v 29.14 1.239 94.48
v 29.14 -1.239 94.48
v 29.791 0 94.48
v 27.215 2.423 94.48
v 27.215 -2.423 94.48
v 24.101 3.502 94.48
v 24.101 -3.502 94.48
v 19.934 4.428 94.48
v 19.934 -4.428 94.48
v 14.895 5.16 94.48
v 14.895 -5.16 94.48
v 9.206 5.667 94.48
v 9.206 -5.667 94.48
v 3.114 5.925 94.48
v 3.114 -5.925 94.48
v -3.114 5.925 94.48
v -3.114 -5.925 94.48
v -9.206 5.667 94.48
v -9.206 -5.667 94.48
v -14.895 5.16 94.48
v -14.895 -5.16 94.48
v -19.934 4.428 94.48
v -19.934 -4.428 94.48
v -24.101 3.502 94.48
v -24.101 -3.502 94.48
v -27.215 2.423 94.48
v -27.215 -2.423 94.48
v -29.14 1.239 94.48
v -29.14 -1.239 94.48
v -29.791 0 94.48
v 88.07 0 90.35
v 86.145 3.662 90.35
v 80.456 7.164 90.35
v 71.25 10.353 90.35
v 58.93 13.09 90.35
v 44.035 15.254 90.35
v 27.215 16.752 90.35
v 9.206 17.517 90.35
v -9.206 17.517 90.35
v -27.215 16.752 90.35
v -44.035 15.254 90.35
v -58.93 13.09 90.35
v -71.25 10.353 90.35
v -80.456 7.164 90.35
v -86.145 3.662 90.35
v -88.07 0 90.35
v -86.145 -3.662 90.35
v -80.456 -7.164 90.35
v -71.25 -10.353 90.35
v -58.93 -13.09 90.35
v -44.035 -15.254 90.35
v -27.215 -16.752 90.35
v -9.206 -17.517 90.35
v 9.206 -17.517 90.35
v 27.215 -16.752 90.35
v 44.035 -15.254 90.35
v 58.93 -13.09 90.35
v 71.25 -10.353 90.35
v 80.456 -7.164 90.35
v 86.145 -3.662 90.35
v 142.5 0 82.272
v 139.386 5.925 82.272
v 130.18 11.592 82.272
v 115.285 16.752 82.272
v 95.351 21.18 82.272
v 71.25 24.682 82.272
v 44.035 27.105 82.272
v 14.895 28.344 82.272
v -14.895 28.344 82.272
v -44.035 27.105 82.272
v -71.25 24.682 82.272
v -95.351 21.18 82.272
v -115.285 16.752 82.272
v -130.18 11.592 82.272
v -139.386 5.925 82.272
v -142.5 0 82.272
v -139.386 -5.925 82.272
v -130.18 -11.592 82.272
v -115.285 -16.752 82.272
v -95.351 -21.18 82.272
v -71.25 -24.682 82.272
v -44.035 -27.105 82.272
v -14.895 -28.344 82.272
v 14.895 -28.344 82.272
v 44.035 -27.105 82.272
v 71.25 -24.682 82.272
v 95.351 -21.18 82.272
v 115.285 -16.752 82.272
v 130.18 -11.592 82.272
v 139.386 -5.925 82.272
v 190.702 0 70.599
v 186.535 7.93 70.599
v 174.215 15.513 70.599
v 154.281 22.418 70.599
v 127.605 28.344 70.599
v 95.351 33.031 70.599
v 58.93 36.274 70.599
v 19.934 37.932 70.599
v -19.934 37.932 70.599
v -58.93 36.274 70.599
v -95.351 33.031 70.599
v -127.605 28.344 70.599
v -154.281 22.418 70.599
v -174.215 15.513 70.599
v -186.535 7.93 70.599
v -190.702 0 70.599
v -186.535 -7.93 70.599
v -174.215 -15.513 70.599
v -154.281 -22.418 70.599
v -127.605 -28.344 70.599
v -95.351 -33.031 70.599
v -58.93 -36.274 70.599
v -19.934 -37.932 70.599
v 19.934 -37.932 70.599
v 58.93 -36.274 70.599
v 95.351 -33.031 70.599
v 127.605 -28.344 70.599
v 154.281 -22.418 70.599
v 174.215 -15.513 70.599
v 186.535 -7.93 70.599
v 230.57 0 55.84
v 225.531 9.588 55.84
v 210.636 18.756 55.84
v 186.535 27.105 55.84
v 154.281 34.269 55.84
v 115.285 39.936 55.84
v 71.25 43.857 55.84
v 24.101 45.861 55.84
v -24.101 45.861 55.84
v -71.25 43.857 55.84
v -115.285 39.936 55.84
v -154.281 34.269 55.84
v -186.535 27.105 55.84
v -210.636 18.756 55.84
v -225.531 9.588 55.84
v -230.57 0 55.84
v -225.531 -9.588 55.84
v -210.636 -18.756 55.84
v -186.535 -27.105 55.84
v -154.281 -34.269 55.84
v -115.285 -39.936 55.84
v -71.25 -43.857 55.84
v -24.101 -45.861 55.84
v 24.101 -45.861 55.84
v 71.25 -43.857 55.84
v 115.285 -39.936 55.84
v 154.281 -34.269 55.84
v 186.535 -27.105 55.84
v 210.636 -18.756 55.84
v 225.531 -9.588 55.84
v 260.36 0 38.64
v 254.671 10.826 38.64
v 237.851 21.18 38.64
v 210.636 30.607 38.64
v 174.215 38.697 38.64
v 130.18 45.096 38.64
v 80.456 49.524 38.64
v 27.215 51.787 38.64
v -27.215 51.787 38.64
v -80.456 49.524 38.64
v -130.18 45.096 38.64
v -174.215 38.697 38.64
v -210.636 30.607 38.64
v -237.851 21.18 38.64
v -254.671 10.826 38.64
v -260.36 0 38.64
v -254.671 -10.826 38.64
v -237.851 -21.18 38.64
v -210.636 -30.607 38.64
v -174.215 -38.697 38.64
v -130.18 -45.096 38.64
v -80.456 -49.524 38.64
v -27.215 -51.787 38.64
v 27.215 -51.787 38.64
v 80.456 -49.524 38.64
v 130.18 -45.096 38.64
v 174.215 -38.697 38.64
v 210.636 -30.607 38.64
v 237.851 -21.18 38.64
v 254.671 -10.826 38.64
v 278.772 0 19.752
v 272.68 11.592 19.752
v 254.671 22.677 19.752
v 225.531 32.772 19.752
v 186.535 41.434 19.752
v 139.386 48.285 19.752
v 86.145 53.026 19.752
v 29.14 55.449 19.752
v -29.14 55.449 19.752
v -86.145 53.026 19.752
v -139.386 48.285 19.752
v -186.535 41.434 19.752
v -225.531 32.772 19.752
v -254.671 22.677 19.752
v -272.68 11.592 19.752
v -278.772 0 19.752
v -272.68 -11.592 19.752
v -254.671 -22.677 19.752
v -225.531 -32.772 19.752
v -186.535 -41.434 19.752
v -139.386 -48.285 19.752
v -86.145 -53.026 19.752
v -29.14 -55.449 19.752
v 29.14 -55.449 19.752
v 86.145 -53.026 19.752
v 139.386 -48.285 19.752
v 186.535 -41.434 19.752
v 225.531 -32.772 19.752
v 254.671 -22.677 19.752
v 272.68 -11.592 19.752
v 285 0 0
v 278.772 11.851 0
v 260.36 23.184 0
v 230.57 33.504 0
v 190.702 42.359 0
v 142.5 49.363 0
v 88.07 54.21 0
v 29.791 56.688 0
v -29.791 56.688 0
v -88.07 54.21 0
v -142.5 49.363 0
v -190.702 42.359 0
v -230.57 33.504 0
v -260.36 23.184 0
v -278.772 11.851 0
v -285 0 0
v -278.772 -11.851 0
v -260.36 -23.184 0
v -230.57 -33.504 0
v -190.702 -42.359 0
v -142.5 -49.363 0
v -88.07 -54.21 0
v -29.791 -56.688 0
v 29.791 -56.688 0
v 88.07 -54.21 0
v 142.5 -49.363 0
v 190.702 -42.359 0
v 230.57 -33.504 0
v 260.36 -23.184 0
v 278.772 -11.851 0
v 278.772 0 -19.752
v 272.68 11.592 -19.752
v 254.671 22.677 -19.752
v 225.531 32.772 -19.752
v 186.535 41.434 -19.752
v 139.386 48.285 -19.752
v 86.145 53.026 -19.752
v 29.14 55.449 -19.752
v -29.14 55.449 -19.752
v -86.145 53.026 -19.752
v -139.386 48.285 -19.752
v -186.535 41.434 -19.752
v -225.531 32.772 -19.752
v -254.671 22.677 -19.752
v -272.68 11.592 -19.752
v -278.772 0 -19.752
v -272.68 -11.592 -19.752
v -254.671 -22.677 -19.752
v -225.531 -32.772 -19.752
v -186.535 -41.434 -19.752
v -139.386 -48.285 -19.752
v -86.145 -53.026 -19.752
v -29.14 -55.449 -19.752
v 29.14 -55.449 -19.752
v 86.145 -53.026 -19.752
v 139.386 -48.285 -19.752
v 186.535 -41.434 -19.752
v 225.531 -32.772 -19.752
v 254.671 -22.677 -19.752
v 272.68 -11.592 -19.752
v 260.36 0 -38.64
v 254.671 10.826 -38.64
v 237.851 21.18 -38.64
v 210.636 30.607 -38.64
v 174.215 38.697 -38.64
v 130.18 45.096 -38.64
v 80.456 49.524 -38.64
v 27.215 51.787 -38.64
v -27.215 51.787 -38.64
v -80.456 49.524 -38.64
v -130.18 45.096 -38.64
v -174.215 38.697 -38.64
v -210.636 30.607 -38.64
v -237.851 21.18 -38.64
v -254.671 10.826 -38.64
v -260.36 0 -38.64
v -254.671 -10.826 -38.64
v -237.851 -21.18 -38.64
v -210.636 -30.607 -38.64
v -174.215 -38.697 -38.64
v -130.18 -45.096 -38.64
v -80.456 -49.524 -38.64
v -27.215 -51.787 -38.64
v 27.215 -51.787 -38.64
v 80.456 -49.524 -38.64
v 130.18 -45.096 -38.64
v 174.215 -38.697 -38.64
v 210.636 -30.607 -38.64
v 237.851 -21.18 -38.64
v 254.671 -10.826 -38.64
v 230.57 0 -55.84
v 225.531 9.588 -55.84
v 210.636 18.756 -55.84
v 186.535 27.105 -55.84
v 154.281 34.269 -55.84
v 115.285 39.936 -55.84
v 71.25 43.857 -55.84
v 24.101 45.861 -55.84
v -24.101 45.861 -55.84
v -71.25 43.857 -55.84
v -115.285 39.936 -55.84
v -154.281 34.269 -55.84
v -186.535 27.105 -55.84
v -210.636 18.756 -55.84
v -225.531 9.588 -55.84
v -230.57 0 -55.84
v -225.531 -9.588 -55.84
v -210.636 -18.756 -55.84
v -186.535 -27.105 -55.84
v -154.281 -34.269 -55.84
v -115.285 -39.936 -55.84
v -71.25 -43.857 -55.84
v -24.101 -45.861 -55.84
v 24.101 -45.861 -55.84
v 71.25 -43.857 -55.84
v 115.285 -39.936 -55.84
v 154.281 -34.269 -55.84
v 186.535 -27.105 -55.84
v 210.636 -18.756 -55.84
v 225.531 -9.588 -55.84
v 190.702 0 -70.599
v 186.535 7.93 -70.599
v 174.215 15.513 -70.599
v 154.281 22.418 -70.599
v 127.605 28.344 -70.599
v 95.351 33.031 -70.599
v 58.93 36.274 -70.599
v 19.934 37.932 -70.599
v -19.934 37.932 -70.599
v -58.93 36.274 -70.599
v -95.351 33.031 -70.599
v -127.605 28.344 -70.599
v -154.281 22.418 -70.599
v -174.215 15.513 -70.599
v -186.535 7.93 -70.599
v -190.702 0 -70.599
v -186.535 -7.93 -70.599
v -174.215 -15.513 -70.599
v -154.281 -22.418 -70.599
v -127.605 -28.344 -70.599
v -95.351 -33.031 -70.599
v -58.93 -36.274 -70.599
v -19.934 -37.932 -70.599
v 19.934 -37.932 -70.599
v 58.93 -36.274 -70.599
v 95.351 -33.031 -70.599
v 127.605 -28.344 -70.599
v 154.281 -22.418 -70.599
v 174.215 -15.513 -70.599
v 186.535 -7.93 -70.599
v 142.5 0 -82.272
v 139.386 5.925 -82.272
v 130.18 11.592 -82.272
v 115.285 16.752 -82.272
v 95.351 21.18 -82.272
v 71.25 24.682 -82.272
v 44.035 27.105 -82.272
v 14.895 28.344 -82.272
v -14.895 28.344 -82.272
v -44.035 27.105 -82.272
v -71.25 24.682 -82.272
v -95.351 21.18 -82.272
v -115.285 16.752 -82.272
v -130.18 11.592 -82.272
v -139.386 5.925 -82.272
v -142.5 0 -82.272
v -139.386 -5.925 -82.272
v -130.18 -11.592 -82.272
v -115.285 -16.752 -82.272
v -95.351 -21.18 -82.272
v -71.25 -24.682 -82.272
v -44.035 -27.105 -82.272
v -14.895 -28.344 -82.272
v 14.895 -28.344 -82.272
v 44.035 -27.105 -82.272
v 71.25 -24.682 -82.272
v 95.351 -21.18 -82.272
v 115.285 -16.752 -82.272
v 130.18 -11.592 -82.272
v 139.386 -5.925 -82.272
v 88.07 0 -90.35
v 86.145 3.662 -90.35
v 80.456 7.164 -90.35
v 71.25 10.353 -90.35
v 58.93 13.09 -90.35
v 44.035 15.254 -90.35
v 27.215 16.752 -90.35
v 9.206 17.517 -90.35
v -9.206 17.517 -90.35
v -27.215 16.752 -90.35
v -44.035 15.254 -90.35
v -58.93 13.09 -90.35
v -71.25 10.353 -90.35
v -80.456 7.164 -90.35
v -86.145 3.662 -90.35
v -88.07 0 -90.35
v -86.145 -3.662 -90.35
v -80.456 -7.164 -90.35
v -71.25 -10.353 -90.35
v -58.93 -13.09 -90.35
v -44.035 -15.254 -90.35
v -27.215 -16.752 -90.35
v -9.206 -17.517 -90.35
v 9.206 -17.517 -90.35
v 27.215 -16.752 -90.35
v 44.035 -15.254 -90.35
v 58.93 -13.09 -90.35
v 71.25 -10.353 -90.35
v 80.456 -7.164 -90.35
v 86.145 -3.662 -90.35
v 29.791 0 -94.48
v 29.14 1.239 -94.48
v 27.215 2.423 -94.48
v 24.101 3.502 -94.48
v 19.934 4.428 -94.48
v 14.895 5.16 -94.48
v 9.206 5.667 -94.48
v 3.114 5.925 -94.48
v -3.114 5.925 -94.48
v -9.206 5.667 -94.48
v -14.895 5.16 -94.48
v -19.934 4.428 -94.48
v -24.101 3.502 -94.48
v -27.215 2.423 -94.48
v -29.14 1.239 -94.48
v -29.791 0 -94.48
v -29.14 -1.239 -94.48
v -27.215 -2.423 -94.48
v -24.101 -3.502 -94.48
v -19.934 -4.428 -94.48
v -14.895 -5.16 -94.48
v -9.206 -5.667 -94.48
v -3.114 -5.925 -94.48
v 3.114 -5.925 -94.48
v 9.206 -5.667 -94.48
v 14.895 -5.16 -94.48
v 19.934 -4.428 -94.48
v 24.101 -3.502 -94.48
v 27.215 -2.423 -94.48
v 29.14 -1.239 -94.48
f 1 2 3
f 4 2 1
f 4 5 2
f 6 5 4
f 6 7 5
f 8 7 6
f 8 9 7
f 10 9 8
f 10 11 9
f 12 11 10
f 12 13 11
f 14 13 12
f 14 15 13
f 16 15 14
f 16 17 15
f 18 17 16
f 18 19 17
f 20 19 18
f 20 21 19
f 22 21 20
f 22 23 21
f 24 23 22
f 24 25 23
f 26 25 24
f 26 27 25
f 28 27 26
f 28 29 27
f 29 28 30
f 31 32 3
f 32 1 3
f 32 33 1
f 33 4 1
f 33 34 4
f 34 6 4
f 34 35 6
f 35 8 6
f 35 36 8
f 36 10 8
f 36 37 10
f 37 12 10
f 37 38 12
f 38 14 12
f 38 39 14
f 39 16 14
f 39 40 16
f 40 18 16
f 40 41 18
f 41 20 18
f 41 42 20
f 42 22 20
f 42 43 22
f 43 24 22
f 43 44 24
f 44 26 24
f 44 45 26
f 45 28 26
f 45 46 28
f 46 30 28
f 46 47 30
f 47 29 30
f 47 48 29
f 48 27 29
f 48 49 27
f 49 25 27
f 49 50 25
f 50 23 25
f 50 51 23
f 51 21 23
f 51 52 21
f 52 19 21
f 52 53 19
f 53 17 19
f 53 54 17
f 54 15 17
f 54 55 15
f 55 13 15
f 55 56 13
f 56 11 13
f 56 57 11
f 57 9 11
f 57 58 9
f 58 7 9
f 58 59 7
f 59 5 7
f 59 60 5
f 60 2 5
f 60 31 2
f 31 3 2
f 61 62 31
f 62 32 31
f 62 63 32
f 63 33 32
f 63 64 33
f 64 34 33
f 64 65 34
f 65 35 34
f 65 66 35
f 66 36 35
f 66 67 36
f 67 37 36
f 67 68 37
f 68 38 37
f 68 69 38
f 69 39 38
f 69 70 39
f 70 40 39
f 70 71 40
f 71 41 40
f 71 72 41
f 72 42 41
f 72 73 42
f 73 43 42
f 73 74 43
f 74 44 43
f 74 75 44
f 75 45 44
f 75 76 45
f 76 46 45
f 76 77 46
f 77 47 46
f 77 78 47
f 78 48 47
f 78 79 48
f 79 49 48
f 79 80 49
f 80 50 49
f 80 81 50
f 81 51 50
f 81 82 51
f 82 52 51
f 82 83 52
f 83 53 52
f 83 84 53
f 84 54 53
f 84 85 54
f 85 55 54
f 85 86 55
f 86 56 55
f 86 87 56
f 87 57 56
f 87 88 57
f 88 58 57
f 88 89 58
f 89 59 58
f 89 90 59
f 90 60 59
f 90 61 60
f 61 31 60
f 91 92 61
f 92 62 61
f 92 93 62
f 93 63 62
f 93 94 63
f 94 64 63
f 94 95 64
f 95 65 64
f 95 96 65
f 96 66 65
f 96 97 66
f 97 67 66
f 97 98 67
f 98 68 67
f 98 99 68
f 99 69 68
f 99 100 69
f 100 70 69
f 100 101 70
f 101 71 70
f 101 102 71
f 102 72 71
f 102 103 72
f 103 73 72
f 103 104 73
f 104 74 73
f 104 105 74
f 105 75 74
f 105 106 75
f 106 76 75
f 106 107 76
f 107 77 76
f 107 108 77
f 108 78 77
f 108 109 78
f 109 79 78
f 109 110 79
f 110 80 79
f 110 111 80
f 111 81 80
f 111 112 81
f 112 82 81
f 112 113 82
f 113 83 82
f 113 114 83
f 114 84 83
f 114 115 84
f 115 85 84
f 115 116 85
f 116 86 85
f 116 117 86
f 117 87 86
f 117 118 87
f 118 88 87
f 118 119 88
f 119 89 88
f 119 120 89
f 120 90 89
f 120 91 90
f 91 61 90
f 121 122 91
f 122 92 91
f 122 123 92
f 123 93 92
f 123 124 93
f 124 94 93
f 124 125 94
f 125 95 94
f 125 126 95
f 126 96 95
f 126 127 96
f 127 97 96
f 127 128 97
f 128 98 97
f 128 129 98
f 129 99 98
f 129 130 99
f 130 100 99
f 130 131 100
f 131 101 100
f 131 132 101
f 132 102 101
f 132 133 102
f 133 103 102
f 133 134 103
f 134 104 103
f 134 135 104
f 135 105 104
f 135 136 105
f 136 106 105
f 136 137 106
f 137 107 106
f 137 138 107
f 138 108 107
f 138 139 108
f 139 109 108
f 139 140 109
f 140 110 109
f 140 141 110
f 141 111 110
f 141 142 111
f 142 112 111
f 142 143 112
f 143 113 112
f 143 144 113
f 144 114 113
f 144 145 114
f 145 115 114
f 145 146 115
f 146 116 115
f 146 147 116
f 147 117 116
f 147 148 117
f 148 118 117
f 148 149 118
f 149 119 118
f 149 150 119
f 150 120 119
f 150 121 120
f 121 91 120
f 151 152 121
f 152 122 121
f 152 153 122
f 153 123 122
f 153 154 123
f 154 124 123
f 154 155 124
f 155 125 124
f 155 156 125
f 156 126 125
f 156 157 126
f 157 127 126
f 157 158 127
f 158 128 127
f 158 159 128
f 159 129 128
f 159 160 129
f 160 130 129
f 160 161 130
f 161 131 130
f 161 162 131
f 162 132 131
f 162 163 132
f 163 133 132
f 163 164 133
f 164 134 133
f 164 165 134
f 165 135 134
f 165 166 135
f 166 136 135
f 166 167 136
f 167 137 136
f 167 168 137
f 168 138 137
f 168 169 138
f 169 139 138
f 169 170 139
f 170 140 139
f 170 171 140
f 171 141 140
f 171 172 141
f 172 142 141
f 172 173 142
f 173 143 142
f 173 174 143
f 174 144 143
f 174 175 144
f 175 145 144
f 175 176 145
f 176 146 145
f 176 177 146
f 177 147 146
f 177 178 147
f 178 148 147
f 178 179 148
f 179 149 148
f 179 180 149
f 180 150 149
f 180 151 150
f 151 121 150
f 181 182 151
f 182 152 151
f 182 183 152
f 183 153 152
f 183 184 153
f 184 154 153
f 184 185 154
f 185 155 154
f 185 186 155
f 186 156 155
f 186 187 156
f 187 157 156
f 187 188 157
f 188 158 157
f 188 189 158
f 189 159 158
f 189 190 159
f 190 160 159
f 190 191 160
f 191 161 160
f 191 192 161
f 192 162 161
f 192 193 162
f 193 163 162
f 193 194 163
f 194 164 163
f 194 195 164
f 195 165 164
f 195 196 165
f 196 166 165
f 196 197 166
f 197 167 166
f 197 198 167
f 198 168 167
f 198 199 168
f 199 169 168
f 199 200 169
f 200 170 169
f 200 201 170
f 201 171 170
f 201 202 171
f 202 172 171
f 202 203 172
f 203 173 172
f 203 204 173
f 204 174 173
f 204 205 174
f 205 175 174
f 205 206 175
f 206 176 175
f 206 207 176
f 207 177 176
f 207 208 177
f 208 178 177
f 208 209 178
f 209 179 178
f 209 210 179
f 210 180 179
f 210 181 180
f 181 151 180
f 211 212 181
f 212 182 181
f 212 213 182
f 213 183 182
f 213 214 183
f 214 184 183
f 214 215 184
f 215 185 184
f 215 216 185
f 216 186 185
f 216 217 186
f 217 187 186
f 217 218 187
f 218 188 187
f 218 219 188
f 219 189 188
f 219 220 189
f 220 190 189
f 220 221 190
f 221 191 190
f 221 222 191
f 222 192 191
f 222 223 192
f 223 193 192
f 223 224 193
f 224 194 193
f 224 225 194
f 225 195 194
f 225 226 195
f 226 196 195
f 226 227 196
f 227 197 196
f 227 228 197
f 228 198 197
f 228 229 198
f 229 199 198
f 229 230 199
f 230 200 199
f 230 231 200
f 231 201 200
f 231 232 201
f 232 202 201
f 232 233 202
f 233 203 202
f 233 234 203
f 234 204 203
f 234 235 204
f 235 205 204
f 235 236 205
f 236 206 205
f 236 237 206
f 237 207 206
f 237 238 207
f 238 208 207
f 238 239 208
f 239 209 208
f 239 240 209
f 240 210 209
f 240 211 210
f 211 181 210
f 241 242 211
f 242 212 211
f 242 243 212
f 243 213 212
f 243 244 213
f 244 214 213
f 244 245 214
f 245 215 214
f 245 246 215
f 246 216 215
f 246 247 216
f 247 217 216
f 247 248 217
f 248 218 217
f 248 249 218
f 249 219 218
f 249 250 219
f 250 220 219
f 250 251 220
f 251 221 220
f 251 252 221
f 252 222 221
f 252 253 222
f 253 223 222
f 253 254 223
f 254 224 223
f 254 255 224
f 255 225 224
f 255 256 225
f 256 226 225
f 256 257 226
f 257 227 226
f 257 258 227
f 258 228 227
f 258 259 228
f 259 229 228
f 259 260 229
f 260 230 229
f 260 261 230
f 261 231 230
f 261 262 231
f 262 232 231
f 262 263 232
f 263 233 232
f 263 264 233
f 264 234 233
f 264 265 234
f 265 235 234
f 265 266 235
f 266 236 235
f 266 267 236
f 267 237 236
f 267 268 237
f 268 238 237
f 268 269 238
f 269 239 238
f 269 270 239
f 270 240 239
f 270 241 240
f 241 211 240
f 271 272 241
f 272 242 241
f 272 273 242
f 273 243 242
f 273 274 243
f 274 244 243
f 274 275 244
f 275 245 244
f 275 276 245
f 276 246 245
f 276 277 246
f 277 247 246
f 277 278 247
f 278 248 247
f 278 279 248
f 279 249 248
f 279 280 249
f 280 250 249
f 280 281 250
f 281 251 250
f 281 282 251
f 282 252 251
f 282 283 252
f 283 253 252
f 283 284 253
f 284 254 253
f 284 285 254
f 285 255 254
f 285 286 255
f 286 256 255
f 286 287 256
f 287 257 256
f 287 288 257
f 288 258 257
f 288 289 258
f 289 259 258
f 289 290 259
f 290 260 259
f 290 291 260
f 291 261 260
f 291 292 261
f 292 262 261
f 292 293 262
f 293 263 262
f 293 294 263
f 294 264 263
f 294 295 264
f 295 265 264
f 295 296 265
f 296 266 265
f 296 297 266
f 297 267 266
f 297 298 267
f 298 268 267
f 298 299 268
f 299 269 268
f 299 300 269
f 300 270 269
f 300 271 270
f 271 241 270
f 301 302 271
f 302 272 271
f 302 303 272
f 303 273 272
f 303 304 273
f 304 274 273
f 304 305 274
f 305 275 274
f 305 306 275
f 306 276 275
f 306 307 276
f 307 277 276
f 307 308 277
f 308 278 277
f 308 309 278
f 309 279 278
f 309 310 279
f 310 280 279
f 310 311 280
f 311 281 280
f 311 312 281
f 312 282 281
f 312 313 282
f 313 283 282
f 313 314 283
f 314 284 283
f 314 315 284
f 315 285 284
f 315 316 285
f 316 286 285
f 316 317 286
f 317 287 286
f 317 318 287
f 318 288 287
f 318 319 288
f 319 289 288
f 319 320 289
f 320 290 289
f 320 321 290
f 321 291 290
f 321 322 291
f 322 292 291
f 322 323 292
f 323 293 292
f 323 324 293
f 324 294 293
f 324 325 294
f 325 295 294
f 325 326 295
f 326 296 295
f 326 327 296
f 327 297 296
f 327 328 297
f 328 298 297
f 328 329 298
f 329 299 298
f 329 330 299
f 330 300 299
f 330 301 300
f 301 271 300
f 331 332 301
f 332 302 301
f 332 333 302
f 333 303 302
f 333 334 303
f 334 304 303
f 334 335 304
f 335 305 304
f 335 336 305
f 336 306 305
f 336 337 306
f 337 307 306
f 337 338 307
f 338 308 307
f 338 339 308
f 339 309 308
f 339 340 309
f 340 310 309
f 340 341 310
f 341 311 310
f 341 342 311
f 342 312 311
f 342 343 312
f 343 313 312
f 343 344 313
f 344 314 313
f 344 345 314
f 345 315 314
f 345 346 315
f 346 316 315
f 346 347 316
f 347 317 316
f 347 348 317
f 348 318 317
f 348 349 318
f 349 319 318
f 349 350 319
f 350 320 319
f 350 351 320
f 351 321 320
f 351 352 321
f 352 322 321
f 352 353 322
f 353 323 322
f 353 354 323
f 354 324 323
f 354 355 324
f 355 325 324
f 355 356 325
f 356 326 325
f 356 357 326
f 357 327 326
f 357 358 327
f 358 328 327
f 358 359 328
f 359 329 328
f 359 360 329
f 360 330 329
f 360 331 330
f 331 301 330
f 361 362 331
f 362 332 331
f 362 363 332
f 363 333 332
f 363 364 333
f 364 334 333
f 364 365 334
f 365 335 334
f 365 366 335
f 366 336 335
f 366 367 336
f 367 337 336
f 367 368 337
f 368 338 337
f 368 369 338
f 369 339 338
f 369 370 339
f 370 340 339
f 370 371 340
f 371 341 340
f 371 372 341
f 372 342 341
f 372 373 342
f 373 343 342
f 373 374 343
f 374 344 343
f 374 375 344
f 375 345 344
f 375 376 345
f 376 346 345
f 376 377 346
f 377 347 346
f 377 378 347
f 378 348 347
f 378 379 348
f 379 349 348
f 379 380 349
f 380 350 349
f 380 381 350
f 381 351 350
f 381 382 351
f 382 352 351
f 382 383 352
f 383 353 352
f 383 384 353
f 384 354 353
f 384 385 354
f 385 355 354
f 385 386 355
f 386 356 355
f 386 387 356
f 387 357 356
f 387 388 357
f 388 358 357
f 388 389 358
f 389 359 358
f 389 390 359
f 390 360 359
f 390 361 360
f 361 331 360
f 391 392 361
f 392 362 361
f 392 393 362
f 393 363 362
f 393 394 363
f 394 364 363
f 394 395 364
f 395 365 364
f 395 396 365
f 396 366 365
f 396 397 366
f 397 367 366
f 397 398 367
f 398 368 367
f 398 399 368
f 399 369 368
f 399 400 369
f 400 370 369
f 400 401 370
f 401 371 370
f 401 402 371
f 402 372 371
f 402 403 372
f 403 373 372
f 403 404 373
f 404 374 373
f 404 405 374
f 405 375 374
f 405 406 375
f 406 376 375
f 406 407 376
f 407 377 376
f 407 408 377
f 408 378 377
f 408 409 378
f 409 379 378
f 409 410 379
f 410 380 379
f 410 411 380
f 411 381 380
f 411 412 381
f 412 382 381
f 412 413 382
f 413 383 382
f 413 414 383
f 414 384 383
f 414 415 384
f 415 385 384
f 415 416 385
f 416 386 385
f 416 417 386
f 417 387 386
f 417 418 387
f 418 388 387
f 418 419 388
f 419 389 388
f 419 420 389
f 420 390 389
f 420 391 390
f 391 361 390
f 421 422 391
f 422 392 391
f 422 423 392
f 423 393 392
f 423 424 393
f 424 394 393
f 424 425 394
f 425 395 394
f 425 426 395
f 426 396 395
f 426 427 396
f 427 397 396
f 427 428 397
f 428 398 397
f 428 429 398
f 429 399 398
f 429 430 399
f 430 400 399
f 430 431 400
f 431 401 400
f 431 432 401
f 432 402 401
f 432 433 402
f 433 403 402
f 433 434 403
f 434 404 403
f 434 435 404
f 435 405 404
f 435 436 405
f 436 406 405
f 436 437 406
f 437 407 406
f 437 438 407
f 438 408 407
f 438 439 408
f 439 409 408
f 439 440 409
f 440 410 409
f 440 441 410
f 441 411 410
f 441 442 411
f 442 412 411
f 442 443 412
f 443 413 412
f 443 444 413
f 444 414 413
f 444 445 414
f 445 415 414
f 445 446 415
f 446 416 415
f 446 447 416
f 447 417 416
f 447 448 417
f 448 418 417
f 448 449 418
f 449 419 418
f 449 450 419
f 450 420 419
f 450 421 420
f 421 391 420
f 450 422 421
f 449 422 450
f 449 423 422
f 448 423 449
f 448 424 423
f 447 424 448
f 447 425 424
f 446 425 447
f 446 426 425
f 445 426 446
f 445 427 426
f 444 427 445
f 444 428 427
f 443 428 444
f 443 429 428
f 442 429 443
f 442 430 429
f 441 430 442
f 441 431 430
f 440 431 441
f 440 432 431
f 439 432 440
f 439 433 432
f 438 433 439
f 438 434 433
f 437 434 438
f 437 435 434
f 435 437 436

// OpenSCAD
// Generated by SolidPython 1.0.1 on 2020-07-29 00:46:51


scale(v = [15, 3, 5]) {
	sphere(r = 19);
}
/***********************************************
*********      SolidPython code:      **********
************************************************
 
# import packages: SolidPython
from solid import *
from solid.utils import *
from itertools import chain, combinations, permutations


class Resize:

    def __init__(self, scad_file):
        self.scad_file = scad_file
        #self.scad_file = import_scad(scad_file)
        # cone/cylinder param:
        self.r1 = 0
        self.r2 = 0
        self.h = 0
        # rectangular prism param:
        self.w = 0
        self.l = 0
        # ellipse param:
        self.r = 0

    # import OpenScad code (file name corresponds to shape)


    # classify shape + parameters
    def assign(self, param1, param2, param3):
        if self.scad_file == 'cone.scad':
            self.r1 = param1
            self.r2 = param2
            self.h = param3
        elif self.scad_file == 'cylinder.scad':
            self.r1 = param1
            self.r2 = param2
            self.h = param3
        elif self.scad_file == 'rectangularPrism.scad':
            self.h = param1
            self.l = param2
            self.w = param3
        else:
            self.r = param1
            self.h = param2

    # resize parameters
    def iterate(self):
        x = range(3, 20, 2)
        i = 1
        if self.scad_file == 'cone.scad':
            tempList = list(permutations(x, 2))
            for temp in tempList:
                param1 = temp[0]
                param2 = temp[1]
                filepath = 'produced_scad_files/' + 'cone' + str(param1) + '_' + str(param2) + '_' + '.scad'
                scad_render_to_file(cylinder(h=param1, r1=param2, r2=0), filepath)

        elif self.scad_file == 'cylinder.scad':
            tempList = list(permutations(x, 3))
            for temp in tempList:
                param1 = temp[0]
                param2 = temp[1]
                filepath = 'produced_scad_files/' + 'cylinder' + str(param1) + '_' + str(param2) + '_' + '.scad'
                scad_render_to_file(cylinder(h=param1, r1=param2, r2=param2), filepath)

        elif self.scad_file == 'rectangularPrism.scad':
            tempList = list(permutations(x, 3))
            for temp in tempList:
                param1 = temp[0]
                param2 = temp[1]
                param3 = temp[2]
                filepath = 'produced_scad_files/' + 'rectangularPrism' + str(param1) + '_' + str(param2) + '_' + str(
                    param3) + '.scad'
                scad_render_to_file(cube(size=(param1, param2, param3)), filepath)

        elif self.scad_file == 'ellipse.scad':
            tempList = list(permutations(x, 4))
            for temp in tempList:
                param1 = temp[0]
                param2 = temp[1]
                param3 = temp[2]
                param4 = temp[3]
                filepath = 'produced_scad_files/' + 'ellipse' + str(param1) + '_' + str(param2) + '_' + str(param3) + '_' + str(param4) + '.scad'
                scad_render_to_file(scale([param1, param2, param3])(sphere(r=param4)), filepath)

    def render_to_scadfile(self):
        scad_render_to_file(scad, 'example.scad') 
 
************************************************/
